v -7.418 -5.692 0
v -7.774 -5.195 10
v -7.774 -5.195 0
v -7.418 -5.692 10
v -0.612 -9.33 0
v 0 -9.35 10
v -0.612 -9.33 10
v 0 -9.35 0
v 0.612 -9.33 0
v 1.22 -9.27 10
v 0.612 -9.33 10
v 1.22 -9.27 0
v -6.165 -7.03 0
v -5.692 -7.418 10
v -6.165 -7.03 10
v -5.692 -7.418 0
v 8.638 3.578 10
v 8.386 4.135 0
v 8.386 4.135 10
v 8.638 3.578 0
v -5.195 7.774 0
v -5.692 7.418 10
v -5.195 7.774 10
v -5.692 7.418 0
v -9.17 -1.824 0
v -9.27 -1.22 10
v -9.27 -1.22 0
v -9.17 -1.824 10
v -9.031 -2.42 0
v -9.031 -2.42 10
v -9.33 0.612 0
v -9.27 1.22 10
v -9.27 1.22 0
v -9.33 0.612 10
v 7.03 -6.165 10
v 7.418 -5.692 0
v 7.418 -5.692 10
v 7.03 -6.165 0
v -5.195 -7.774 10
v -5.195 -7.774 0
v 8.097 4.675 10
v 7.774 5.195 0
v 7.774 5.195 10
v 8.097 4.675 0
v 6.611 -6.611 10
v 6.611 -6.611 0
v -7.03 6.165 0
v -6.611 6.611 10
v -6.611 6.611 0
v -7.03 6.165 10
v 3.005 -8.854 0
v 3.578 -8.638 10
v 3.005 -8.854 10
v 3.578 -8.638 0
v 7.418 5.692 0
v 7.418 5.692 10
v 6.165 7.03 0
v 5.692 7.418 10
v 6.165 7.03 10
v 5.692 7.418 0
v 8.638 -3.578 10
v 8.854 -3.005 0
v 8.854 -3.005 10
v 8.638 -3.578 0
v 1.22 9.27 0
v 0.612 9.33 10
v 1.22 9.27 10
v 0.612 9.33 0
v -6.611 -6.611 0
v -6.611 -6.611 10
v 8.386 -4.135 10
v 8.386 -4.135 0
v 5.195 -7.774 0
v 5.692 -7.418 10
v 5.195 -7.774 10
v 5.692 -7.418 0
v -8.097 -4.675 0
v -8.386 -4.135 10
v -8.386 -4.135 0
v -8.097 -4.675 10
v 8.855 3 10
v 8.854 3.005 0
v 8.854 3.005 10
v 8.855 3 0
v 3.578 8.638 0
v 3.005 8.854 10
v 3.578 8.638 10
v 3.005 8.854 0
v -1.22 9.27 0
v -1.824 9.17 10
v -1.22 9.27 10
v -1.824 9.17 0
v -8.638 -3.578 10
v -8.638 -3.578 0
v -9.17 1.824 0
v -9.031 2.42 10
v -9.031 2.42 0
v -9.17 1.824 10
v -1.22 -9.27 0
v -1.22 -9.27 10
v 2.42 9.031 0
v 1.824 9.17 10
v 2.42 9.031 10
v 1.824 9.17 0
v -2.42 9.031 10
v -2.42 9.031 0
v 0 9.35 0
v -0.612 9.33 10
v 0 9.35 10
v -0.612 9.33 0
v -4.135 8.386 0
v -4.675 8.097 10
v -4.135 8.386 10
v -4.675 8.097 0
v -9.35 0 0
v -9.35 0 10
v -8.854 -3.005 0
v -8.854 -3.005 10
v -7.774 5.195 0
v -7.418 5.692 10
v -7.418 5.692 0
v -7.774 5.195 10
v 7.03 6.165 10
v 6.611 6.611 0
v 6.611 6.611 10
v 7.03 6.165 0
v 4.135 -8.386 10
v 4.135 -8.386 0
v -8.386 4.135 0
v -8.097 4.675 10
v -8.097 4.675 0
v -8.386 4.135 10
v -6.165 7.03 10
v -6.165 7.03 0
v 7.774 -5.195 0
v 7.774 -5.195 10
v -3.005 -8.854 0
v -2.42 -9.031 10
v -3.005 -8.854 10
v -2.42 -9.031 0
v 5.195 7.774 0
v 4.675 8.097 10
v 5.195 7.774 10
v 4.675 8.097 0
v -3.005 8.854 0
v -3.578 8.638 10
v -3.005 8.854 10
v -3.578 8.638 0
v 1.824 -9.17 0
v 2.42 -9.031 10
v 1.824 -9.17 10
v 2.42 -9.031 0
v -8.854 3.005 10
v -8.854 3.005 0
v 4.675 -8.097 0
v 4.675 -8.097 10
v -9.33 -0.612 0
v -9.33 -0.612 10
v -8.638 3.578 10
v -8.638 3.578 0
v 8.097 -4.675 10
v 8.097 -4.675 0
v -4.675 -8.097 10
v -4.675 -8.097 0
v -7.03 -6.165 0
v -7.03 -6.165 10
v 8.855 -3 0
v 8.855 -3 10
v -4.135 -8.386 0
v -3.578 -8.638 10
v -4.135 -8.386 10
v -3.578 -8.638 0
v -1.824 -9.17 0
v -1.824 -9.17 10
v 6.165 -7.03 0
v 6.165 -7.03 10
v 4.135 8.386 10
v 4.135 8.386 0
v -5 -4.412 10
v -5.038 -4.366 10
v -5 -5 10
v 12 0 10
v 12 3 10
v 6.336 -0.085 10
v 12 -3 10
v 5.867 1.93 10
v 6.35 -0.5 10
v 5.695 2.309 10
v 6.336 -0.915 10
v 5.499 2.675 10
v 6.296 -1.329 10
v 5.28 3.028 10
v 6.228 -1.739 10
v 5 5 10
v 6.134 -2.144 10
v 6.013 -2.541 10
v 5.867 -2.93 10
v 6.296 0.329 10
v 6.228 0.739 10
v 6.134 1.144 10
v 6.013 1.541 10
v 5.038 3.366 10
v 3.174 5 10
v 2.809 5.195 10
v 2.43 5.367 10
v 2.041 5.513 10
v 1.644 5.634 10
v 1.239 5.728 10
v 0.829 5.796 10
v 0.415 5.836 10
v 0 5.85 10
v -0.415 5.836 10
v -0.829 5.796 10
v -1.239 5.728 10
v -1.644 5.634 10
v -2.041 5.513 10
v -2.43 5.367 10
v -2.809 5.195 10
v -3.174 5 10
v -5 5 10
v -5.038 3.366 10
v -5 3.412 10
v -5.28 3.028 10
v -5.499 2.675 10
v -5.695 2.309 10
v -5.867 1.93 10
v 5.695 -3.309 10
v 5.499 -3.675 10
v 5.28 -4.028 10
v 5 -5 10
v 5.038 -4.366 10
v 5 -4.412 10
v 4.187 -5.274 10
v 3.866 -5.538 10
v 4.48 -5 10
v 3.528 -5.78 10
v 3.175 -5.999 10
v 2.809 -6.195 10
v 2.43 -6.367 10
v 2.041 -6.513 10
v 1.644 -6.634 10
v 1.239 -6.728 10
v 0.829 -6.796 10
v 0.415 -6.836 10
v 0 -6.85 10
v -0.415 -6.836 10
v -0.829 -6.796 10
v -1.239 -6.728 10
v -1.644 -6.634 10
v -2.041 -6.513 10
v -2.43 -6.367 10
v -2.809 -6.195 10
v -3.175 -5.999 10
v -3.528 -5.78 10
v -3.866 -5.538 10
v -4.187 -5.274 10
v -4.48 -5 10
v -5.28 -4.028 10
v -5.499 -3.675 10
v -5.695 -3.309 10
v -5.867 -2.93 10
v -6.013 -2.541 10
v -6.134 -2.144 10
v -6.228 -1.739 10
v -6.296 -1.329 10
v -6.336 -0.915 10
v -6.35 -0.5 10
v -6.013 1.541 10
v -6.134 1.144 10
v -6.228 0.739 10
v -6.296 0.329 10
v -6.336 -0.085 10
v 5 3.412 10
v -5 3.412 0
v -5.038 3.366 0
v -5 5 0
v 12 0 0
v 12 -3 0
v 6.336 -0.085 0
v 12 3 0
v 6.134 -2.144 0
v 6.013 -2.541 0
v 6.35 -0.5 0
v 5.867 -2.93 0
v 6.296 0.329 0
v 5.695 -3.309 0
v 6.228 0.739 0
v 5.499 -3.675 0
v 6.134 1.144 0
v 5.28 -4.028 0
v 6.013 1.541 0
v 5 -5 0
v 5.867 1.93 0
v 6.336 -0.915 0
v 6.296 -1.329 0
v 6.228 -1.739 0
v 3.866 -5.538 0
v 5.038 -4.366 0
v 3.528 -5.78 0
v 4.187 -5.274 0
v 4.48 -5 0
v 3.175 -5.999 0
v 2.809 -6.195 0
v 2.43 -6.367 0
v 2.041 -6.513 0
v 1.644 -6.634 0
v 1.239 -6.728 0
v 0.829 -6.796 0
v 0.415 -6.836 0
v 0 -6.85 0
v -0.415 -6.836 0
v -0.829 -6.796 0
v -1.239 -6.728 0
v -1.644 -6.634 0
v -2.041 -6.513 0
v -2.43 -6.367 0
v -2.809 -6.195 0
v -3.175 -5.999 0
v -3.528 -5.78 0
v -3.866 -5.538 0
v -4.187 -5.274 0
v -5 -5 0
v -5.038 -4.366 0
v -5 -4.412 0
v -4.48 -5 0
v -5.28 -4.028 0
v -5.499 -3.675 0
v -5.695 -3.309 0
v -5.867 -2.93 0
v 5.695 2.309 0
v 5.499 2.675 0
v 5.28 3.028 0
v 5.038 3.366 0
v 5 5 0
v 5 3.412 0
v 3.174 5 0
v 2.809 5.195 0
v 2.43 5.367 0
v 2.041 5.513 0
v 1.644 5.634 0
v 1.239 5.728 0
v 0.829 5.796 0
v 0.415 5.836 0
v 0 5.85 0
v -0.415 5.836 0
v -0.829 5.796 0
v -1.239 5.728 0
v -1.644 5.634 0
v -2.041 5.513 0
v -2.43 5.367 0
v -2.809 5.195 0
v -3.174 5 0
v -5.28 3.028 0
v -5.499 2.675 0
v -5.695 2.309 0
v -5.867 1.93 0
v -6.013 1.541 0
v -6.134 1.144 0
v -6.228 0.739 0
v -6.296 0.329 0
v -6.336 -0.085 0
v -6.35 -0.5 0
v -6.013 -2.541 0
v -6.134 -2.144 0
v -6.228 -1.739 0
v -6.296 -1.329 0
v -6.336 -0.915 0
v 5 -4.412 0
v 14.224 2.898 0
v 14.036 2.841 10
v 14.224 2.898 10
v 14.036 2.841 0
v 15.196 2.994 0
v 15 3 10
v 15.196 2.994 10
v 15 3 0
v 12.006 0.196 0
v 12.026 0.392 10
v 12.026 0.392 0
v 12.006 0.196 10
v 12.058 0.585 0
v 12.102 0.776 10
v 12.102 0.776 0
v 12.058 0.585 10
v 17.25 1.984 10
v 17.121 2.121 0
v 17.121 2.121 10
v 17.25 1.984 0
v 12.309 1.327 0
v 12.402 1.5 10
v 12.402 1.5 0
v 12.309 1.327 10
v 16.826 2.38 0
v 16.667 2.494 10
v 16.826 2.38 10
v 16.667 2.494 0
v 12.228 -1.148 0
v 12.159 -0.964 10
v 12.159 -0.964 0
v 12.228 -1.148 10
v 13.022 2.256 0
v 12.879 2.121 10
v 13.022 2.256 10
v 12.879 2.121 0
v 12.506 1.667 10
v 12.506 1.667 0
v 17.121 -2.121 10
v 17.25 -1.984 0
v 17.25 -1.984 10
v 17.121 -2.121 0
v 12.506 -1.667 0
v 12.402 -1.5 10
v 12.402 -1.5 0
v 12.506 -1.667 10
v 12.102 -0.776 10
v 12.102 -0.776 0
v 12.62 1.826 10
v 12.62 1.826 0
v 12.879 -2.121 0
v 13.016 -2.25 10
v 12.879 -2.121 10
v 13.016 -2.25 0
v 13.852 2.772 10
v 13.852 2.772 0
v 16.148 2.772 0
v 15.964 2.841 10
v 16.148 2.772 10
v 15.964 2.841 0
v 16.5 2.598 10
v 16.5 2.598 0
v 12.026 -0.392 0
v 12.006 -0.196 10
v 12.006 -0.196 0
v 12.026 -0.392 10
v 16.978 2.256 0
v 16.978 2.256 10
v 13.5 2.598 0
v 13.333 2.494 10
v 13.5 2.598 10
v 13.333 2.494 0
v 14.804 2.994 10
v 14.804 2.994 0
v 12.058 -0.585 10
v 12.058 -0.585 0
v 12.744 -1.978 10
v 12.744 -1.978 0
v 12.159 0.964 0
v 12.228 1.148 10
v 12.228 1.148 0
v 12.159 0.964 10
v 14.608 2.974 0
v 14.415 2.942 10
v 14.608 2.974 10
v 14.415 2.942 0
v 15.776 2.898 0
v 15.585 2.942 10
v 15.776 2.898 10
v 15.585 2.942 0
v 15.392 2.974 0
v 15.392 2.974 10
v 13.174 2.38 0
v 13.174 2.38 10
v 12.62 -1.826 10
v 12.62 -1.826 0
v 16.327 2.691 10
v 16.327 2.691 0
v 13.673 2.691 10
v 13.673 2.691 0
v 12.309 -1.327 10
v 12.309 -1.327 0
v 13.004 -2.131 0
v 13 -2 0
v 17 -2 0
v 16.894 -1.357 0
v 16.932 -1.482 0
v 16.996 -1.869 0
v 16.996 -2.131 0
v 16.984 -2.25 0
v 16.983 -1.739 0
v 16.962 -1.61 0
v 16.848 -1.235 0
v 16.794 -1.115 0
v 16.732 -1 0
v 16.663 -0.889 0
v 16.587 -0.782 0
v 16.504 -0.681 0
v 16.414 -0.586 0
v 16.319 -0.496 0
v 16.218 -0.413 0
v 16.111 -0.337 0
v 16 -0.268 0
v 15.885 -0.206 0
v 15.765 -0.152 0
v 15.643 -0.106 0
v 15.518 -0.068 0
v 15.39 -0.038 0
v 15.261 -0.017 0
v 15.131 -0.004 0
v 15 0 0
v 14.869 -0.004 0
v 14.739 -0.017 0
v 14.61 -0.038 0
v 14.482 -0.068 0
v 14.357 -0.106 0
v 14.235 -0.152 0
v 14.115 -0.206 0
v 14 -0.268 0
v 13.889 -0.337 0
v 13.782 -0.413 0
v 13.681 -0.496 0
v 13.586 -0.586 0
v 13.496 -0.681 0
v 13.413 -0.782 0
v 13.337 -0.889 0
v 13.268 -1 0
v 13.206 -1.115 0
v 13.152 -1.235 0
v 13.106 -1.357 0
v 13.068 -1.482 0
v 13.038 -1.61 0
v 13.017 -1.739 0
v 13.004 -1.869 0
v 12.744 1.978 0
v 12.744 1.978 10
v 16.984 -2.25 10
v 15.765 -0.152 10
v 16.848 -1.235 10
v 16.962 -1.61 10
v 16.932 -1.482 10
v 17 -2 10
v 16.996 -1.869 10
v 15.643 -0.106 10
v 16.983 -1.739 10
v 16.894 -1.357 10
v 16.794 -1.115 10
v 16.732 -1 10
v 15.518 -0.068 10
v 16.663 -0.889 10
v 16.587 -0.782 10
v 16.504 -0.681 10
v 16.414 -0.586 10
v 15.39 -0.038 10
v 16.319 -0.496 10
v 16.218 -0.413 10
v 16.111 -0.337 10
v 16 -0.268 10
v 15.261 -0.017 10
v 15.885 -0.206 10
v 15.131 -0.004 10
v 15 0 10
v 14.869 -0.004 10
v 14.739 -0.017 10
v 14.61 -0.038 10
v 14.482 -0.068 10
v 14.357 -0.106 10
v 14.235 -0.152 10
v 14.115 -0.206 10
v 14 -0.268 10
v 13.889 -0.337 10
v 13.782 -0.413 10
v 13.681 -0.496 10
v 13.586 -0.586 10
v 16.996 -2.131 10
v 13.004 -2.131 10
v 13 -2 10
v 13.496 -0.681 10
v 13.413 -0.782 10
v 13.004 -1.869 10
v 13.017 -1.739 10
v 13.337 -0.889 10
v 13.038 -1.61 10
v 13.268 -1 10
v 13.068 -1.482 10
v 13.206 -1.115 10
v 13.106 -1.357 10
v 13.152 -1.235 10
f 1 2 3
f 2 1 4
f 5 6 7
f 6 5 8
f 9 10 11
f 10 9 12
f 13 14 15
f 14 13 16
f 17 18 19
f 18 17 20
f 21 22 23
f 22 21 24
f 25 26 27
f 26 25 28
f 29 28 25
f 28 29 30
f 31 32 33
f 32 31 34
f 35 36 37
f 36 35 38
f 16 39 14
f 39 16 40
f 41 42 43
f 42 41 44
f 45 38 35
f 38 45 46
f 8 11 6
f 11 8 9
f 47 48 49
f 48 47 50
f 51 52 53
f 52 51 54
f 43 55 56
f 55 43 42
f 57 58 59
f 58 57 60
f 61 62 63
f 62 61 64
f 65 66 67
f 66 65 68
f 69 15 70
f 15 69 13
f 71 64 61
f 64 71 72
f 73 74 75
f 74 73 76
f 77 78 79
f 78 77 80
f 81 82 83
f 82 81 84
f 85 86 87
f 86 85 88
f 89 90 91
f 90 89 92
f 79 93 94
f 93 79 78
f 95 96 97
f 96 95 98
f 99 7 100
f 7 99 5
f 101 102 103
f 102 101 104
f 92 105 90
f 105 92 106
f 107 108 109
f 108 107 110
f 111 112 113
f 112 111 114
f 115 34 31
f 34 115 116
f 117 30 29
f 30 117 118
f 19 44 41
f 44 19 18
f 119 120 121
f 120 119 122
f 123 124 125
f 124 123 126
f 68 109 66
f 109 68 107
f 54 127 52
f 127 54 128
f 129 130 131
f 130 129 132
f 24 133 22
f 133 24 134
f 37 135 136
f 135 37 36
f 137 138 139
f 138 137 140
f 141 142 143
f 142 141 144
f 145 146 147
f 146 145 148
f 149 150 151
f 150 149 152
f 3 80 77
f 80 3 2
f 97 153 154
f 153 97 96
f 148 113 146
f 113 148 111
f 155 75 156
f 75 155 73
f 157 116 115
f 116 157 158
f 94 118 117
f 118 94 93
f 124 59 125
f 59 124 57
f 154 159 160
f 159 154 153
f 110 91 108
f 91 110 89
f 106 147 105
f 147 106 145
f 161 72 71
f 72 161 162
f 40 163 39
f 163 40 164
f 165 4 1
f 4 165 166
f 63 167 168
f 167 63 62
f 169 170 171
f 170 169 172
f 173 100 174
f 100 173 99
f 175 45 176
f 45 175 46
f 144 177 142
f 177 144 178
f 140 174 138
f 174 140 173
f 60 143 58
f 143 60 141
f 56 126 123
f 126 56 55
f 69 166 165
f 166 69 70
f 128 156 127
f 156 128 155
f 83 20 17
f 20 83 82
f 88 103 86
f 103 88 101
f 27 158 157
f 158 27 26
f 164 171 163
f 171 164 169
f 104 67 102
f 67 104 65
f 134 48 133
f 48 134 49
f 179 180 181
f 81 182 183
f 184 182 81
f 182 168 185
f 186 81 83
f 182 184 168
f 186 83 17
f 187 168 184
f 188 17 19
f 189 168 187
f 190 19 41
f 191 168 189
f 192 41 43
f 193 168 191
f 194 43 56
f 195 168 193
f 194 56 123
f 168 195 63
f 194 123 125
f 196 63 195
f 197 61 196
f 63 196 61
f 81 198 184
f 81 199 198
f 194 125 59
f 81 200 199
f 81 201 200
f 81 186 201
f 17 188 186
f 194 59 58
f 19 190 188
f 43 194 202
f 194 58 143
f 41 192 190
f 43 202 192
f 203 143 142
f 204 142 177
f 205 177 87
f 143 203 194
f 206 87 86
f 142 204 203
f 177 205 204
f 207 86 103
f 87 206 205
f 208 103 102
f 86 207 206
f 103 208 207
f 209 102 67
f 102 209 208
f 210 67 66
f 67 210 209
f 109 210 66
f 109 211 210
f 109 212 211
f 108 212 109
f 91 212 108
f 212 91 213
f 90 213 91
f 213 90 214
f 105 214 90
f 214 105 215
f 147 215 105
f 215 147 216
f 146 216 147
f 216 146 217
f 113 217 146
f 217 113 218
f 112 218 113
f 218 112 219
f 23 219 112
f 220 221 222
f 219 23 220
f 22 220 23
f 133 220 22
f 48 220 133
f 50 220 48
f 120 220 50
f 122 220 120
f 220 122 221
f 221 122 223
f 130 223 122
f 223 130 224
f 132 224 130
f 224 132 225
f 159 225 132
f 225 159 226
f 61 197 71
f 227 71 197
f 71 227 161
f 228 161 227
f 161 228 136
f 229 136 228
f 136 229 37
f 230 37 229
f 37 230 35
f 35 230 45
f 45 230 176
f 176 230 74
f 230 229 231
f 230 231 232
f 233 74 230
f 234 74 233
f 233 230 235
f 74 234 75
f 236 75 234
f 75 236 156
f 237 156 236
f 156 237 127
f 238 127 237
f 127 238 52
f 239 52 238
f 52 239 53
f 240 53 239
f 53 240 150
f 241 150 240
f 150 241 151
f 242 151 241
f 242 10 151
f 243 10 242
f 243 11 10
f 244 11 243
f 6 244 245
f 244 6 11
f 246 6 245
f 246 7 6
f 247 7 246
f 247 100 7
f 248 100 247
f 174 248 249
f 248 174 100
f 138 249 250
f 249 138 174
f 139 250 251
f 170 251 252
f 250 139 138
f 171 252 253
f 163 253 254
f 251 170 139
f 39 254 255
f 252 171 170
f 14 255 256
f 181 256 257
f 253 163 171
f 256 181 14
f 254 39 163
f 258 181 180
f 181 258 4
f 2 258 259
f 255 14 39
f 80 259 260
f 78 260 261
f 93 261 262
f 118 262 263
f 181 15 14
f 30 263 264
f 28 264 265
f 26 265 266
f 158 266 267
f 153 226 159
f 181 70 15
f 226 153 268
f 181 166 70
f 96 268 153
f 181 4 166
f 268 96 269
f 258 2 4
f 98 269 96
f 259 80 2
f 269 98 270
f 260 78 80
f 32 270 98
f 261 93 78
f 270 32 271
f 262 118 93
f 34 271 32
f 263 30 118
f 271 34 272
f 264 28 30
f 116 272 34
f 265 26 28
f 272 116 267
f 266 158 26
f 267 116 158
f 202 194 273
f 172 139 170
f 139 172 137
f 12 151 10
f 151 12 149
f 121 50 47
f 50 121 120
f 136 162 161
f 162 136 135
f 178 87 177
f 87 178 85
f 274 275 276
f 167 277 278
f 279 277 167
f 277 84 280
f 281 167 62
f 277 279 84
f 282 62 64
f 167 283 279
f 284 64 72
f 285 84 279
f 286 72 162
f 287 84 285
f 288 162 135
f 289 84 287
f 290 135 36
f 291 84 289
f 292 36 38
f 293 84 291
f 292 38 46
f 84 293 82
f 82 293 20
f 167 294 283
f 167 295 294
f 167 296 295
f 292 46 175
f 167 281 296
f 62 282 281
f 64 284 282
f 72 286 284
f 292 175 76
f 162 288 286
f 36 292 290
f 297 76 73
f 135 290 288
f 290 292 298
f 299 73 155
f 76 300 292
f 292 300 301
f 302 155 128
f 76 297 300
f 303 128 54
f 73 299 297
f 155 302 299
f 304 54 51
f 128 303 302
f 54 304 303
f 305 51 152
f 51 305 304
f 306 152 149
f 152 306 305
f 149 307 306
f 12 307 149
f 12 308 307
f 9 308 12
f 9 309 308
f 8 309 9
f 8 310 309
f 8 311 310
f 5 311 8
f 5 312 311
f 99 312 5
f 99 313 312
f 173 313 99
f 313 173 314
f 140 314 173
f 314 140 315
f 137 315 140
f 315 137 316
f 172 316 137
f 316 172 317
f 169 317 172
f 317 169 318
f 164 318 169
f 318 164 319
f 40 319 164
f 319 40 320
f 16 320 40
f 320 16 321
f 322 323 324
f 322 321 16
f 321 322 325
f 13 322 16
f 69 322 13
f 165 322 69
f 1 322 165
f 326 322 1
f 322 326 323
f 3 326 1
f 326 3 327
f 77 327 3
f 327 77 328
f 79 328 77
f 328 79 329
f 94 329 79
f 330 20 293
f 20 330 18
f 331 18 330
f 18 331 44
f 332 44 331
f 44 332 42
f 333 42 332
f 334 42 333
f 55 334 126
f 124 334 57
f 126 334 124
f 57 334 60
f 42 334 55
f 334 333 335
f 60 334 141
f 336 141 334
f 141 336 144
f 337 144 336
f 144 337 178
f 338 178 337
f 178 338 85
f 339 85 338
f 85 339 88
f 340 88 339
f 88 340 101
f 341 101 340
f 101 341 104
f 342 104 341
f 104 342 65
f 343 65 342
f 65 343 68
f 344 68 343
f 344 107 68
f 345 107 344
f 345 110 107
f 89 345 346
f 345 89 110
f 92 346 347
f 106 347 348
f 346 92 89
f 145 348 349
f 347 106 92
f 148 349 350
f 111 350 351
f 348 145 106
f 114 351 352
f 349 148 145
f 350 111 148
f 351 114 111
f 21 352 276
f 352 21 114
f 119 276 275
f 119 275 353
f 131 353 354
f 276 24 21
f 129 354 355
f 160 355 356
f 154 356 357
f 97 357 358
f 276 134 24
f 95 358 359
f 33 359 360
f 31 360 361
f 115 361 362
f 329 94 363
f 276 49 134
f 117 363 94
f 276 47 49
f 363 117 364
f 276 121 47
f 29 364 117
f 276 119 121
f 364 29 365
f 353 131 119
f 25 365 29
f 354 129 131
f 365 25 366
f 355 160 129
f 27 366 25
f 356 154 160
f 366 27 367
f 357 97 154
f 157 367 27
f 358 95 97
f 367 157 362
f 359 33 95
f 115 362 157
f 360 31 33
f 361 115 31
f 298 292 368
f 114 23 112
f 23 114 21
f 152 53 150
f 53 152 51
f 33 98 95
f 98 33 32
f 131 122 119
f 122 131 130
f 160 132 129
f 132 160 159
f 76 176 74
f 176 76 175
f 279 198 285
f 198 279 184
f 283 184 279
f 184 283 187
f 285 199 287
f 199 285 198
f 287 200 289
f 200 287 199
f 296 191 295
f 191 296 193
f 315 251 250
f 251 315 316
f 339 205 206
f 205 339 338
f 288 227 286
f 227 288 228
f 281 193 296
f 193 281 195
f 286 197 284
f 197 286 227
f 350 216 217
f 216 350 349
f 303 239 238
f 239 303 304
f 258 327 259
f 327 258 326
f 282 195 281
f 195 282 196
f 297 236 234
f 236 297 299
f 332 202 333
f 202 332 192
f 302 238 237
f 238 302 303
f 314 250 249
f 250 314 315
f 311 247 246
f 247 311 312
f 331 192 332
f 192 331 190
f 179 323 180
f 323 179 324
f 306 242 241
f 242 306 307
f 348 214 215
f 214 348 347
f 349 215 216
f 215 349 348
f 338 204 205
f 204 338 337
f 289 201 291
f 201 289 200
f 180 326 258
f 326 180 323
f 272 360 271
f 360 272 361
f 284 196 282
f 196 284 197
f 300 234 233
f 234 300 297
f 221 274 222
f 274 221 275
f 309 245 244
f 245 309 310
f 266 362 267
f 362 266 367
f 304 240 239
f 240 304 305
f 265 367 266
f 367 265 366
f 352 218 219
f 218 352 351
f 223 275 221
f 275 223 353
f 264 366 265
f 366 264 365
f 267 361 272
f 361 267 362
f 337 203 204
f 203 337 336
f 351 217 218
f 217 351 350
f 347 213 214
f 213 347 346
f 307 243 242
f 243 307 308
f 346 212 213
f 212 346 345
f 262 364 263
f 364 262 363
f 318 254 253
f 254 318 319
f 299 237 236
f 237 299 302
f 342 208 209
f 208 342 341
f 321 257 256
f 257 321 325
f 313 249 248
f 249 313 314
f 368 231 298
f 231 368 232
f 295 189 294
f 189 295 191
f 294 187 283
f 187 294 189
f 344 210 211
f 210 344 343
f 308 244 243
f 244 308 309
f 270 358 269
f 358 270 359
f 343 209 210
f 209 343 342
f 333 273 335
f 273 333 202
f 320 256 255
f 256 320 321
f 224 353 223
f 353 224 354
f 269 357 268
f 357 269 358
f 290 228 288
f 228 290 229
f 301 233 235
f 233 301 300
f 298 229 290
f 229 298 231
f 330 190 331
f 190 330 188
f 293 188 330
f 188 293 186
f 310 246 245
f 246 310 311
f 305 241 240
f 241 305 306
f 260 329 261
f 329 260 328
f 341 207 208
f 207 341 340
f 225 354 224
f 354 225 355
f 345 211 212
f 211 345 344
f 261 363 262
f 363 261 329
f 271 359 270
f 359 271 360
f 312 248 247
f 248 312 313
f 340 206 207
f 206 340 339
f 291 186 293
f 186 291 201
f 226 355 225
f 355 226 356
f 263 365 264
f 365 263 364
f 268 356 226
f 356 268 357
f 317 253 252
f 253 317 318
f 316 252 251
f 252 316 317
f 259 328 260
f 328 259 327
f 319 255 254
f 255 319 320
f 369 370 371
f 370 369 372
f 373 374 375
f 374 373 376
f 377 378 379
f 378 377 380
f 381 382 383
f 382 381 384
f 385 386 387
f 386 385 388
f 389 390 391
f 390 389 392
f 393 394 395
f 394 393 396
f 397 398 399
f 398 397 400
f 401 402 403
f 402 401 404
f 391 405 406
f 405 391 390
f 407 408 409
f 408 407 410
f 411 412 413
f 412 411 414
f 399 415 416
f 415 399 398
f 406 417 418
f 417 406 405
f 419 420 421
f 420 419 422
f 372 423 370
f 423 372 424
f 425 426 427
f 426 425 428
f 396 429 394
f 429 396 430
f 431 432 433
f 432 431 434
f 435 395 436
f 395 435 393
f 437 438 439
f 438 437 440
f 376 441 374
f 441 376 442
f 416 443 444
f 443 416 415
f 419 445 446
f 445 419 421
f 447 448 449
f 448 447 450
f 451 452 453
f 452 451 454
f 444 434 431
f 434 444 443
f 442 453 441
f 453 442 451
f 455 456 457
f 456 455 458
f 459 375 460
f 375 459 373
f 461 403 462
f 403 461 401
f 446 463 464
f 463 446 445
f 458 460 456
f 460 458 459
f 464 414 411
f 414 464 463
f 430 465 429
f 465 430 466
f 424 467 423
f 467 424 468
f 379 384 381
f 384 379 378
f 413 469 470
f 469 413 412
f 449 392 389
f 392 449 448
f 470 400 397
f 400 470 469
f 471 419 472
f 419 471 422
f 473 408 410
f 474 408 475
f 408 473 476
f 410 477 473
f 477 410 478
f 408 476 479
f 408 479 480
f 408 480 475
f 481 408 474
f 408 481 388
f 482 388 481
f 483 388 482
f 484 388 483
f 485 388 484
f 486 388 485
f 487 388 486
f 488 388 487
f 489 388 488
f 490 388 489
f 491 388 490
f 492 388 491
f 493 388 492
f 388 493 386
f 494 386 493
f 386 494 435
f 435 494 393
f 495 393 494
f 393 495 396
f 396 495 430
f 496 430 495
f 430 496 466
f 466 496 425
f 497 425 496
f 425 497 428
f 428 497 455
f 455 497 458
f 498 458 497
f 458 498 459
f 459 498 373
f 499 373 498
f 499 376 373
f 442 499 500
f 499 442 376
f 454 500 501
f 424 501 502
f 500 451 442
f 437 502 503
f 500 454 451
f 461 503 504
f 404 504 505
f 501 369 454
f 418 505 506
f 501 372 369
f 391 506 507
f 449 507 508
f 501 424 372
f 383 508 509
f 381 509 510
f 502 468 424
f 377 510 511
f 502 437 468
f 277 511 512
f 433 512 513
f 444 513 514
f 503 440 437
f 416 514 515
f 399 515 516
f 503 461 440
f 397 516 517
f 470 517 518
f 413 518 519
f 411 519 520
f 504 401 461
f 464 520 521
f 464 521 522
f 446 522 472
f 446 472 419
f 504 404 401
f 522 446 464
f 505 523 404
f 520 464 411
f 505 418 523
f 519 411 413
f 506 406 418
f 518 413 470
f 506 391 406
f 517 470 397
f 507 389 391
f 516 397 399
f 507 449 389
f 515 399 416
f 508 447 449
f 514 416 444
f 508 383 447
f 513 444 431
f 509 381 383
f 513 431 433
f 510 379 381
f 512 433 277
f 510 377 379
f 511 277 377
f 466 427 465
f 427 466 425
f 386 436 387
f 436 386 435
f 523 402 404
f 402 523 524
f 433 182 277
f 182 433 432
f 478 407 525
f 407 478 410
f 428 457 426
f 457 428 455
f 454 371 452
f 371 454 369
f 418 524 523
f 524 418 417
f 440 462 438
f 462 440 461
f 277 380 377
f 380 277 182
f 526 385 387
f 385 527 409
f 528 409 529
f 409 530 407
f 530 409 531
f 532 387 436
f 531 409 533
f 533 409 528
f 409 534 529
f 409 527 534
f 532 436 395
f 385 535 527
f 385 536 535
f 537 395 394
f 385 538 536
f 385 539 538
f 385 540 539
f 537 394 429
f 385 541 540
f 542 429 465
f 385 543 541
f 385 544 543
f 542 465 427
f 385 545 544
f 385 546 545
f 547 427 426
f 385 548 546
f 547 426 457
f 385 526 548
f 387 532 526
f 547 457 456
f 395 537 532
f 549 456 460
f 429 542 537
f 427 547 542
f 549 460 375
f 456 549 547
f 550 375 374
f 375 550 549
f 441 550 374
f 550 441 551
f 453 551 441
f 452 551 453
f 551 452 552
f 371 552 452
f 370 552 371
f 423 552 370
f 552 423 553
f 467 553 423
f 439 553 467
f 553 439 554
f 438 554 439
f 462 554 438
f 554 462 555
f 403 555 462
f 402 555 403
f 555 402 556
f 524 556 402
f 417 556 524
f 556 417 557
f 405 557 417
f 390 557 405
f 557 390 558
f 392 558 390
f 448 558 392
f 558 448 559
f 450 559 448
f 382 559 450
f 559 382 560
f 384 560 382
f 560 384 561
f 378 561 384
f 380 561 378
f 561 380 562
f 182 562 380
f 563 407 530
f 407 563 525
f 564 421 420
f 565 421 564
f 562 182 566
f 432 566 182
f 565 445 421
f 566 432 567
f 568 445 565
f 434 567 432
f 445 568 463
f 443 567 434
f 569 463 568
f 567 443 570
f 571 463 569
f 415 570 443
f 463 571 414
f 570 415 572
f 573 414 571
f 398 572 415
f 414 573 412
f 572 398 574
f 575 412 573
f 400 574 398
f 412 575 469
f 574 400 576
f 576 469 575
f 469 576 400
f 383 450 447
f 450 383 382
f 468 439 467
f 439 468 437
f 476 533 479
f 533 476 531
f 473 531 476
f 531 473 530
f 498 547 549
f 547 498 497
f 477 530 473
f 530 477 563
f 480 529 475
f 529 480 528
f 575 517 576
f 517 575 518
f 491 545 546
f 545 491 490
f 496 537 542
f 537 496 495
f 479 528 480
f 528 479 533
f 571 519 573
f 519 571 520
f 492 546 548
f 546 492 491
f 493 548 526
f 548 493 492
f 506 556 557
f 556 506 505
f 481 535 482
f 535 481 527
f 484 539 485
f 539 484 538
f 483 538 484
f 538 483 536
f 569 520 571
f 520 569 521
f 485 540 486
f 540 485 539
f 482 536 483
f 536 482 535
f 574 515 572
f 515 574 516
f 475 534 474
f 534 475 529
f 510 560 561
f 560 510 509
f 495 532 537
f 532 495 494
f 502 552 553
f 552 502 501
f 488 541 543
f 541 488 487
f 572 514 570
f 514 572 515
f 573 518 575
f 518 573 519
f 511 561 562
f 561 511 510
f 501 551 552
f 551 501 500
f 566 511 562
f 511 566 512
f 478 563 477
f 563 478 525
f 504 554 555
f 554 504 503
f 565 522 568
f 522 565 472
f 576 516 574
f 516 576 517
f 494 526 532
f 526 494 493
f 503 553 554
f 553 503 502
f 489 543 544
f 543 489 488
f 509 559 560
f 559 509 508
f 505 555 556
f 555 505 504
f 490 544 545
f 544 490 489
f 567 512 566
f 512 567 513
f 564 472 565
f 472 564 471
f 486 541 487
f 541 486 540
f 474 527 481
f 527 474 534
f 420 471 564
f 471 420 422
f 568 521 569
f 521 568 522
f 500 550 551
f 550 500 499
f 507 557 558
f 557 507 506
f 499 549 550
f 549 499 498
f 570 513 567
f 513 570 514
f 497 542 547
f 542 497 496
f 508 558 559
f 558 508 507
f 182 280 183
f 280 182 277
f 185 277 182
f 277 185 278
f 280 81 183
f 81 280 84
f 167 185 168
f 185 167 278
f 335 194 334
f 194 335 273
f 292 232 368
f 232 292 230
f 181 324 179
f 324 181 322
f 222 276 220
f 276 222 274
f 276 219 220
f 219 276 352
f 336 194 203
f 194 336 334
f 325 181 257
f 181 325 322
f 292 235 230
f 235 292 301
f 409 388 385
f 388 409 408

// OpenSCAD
// Tubing clip for a 12.7 mm lab stand rod
// Print orientation: flat on the bed, extruded upward in +Z

$fn = 96;

// ---- Dimensions (mm) ----
ring_od      = 18.7;   // rod ring outer diameter
ring_id      = 12.7;   // rod ring inner diameter (rod bore)
ring_wall    = 3;      // rod ring wall thickness
ring_open    = 10;     // rod ring opening width (along -X)

tube_od      = 6;      // tubing ring outer diameter
tube_id      = 4;      // tubing ring inner diameter (6 mm ID per spec, wall 2 mm -> OD 10 mm? Check: "6 mm inner diameter and 2 mm wall" -> OD = 10 mm. But opening is 4.5 mm wide, so maybe the ring is smaller. Let's re-read: "tubing ring with 6 mm inner diameter and 2 mm wall" -> OD = 10 mm. But the opening is 4.5 mm wide, so the ring must be at least 4.5 mm in X. I'll use OD = 10 mm for the tubing ring.)
tube_wall    = 2;      // tubing ring wall thickness
tube_open    = 4.5;    // tubing opening width (along +X)

bridge_x0    = 8;      // bridge start (X)
bridge_x1    = 12;     // bridge end (X)
bridge_w     = 6;      // bridge width (Y)

eps          = 0.5;    // cutter overshoot past faces
standoff     = 0.5;    // rod ring centre offset from origin (Y)

// ---- Model ----
difference() {
    union() {
        // Rod ring
        difference() {
            cylinder(d = ring_od, h = 10);
            translate([0, -standoff, 0])
                cylinder(d = ring_id, h = 10);
        }
        // Tubing ring
        translate([15, 0, 0])
            difference() {
                cylinder(d = tube_od, h = 10);
                translate([0, -tube_wall, 0])
                    cylinder(d = tube_id, h = 10);
            }
        // Bridge
        translate([bridge_x0, -bridge_w / 2, 0])
            cube([bridge_x1 - bridge_x0, bridge_w, 10]);
    }
    // Rod ring opening (-X side)
    translate([-ring_open / 2, -ring_open / 2, -eps])
        cube([ring_open, ring_open, 10 + 2 * eps]);
    // Tubing opening (+X side)
    translate([15 + tube_open / 2, -tube_open / 2, -eps])
        cube([tube_open, tube_open, 10 + 2 * eps]);
}
